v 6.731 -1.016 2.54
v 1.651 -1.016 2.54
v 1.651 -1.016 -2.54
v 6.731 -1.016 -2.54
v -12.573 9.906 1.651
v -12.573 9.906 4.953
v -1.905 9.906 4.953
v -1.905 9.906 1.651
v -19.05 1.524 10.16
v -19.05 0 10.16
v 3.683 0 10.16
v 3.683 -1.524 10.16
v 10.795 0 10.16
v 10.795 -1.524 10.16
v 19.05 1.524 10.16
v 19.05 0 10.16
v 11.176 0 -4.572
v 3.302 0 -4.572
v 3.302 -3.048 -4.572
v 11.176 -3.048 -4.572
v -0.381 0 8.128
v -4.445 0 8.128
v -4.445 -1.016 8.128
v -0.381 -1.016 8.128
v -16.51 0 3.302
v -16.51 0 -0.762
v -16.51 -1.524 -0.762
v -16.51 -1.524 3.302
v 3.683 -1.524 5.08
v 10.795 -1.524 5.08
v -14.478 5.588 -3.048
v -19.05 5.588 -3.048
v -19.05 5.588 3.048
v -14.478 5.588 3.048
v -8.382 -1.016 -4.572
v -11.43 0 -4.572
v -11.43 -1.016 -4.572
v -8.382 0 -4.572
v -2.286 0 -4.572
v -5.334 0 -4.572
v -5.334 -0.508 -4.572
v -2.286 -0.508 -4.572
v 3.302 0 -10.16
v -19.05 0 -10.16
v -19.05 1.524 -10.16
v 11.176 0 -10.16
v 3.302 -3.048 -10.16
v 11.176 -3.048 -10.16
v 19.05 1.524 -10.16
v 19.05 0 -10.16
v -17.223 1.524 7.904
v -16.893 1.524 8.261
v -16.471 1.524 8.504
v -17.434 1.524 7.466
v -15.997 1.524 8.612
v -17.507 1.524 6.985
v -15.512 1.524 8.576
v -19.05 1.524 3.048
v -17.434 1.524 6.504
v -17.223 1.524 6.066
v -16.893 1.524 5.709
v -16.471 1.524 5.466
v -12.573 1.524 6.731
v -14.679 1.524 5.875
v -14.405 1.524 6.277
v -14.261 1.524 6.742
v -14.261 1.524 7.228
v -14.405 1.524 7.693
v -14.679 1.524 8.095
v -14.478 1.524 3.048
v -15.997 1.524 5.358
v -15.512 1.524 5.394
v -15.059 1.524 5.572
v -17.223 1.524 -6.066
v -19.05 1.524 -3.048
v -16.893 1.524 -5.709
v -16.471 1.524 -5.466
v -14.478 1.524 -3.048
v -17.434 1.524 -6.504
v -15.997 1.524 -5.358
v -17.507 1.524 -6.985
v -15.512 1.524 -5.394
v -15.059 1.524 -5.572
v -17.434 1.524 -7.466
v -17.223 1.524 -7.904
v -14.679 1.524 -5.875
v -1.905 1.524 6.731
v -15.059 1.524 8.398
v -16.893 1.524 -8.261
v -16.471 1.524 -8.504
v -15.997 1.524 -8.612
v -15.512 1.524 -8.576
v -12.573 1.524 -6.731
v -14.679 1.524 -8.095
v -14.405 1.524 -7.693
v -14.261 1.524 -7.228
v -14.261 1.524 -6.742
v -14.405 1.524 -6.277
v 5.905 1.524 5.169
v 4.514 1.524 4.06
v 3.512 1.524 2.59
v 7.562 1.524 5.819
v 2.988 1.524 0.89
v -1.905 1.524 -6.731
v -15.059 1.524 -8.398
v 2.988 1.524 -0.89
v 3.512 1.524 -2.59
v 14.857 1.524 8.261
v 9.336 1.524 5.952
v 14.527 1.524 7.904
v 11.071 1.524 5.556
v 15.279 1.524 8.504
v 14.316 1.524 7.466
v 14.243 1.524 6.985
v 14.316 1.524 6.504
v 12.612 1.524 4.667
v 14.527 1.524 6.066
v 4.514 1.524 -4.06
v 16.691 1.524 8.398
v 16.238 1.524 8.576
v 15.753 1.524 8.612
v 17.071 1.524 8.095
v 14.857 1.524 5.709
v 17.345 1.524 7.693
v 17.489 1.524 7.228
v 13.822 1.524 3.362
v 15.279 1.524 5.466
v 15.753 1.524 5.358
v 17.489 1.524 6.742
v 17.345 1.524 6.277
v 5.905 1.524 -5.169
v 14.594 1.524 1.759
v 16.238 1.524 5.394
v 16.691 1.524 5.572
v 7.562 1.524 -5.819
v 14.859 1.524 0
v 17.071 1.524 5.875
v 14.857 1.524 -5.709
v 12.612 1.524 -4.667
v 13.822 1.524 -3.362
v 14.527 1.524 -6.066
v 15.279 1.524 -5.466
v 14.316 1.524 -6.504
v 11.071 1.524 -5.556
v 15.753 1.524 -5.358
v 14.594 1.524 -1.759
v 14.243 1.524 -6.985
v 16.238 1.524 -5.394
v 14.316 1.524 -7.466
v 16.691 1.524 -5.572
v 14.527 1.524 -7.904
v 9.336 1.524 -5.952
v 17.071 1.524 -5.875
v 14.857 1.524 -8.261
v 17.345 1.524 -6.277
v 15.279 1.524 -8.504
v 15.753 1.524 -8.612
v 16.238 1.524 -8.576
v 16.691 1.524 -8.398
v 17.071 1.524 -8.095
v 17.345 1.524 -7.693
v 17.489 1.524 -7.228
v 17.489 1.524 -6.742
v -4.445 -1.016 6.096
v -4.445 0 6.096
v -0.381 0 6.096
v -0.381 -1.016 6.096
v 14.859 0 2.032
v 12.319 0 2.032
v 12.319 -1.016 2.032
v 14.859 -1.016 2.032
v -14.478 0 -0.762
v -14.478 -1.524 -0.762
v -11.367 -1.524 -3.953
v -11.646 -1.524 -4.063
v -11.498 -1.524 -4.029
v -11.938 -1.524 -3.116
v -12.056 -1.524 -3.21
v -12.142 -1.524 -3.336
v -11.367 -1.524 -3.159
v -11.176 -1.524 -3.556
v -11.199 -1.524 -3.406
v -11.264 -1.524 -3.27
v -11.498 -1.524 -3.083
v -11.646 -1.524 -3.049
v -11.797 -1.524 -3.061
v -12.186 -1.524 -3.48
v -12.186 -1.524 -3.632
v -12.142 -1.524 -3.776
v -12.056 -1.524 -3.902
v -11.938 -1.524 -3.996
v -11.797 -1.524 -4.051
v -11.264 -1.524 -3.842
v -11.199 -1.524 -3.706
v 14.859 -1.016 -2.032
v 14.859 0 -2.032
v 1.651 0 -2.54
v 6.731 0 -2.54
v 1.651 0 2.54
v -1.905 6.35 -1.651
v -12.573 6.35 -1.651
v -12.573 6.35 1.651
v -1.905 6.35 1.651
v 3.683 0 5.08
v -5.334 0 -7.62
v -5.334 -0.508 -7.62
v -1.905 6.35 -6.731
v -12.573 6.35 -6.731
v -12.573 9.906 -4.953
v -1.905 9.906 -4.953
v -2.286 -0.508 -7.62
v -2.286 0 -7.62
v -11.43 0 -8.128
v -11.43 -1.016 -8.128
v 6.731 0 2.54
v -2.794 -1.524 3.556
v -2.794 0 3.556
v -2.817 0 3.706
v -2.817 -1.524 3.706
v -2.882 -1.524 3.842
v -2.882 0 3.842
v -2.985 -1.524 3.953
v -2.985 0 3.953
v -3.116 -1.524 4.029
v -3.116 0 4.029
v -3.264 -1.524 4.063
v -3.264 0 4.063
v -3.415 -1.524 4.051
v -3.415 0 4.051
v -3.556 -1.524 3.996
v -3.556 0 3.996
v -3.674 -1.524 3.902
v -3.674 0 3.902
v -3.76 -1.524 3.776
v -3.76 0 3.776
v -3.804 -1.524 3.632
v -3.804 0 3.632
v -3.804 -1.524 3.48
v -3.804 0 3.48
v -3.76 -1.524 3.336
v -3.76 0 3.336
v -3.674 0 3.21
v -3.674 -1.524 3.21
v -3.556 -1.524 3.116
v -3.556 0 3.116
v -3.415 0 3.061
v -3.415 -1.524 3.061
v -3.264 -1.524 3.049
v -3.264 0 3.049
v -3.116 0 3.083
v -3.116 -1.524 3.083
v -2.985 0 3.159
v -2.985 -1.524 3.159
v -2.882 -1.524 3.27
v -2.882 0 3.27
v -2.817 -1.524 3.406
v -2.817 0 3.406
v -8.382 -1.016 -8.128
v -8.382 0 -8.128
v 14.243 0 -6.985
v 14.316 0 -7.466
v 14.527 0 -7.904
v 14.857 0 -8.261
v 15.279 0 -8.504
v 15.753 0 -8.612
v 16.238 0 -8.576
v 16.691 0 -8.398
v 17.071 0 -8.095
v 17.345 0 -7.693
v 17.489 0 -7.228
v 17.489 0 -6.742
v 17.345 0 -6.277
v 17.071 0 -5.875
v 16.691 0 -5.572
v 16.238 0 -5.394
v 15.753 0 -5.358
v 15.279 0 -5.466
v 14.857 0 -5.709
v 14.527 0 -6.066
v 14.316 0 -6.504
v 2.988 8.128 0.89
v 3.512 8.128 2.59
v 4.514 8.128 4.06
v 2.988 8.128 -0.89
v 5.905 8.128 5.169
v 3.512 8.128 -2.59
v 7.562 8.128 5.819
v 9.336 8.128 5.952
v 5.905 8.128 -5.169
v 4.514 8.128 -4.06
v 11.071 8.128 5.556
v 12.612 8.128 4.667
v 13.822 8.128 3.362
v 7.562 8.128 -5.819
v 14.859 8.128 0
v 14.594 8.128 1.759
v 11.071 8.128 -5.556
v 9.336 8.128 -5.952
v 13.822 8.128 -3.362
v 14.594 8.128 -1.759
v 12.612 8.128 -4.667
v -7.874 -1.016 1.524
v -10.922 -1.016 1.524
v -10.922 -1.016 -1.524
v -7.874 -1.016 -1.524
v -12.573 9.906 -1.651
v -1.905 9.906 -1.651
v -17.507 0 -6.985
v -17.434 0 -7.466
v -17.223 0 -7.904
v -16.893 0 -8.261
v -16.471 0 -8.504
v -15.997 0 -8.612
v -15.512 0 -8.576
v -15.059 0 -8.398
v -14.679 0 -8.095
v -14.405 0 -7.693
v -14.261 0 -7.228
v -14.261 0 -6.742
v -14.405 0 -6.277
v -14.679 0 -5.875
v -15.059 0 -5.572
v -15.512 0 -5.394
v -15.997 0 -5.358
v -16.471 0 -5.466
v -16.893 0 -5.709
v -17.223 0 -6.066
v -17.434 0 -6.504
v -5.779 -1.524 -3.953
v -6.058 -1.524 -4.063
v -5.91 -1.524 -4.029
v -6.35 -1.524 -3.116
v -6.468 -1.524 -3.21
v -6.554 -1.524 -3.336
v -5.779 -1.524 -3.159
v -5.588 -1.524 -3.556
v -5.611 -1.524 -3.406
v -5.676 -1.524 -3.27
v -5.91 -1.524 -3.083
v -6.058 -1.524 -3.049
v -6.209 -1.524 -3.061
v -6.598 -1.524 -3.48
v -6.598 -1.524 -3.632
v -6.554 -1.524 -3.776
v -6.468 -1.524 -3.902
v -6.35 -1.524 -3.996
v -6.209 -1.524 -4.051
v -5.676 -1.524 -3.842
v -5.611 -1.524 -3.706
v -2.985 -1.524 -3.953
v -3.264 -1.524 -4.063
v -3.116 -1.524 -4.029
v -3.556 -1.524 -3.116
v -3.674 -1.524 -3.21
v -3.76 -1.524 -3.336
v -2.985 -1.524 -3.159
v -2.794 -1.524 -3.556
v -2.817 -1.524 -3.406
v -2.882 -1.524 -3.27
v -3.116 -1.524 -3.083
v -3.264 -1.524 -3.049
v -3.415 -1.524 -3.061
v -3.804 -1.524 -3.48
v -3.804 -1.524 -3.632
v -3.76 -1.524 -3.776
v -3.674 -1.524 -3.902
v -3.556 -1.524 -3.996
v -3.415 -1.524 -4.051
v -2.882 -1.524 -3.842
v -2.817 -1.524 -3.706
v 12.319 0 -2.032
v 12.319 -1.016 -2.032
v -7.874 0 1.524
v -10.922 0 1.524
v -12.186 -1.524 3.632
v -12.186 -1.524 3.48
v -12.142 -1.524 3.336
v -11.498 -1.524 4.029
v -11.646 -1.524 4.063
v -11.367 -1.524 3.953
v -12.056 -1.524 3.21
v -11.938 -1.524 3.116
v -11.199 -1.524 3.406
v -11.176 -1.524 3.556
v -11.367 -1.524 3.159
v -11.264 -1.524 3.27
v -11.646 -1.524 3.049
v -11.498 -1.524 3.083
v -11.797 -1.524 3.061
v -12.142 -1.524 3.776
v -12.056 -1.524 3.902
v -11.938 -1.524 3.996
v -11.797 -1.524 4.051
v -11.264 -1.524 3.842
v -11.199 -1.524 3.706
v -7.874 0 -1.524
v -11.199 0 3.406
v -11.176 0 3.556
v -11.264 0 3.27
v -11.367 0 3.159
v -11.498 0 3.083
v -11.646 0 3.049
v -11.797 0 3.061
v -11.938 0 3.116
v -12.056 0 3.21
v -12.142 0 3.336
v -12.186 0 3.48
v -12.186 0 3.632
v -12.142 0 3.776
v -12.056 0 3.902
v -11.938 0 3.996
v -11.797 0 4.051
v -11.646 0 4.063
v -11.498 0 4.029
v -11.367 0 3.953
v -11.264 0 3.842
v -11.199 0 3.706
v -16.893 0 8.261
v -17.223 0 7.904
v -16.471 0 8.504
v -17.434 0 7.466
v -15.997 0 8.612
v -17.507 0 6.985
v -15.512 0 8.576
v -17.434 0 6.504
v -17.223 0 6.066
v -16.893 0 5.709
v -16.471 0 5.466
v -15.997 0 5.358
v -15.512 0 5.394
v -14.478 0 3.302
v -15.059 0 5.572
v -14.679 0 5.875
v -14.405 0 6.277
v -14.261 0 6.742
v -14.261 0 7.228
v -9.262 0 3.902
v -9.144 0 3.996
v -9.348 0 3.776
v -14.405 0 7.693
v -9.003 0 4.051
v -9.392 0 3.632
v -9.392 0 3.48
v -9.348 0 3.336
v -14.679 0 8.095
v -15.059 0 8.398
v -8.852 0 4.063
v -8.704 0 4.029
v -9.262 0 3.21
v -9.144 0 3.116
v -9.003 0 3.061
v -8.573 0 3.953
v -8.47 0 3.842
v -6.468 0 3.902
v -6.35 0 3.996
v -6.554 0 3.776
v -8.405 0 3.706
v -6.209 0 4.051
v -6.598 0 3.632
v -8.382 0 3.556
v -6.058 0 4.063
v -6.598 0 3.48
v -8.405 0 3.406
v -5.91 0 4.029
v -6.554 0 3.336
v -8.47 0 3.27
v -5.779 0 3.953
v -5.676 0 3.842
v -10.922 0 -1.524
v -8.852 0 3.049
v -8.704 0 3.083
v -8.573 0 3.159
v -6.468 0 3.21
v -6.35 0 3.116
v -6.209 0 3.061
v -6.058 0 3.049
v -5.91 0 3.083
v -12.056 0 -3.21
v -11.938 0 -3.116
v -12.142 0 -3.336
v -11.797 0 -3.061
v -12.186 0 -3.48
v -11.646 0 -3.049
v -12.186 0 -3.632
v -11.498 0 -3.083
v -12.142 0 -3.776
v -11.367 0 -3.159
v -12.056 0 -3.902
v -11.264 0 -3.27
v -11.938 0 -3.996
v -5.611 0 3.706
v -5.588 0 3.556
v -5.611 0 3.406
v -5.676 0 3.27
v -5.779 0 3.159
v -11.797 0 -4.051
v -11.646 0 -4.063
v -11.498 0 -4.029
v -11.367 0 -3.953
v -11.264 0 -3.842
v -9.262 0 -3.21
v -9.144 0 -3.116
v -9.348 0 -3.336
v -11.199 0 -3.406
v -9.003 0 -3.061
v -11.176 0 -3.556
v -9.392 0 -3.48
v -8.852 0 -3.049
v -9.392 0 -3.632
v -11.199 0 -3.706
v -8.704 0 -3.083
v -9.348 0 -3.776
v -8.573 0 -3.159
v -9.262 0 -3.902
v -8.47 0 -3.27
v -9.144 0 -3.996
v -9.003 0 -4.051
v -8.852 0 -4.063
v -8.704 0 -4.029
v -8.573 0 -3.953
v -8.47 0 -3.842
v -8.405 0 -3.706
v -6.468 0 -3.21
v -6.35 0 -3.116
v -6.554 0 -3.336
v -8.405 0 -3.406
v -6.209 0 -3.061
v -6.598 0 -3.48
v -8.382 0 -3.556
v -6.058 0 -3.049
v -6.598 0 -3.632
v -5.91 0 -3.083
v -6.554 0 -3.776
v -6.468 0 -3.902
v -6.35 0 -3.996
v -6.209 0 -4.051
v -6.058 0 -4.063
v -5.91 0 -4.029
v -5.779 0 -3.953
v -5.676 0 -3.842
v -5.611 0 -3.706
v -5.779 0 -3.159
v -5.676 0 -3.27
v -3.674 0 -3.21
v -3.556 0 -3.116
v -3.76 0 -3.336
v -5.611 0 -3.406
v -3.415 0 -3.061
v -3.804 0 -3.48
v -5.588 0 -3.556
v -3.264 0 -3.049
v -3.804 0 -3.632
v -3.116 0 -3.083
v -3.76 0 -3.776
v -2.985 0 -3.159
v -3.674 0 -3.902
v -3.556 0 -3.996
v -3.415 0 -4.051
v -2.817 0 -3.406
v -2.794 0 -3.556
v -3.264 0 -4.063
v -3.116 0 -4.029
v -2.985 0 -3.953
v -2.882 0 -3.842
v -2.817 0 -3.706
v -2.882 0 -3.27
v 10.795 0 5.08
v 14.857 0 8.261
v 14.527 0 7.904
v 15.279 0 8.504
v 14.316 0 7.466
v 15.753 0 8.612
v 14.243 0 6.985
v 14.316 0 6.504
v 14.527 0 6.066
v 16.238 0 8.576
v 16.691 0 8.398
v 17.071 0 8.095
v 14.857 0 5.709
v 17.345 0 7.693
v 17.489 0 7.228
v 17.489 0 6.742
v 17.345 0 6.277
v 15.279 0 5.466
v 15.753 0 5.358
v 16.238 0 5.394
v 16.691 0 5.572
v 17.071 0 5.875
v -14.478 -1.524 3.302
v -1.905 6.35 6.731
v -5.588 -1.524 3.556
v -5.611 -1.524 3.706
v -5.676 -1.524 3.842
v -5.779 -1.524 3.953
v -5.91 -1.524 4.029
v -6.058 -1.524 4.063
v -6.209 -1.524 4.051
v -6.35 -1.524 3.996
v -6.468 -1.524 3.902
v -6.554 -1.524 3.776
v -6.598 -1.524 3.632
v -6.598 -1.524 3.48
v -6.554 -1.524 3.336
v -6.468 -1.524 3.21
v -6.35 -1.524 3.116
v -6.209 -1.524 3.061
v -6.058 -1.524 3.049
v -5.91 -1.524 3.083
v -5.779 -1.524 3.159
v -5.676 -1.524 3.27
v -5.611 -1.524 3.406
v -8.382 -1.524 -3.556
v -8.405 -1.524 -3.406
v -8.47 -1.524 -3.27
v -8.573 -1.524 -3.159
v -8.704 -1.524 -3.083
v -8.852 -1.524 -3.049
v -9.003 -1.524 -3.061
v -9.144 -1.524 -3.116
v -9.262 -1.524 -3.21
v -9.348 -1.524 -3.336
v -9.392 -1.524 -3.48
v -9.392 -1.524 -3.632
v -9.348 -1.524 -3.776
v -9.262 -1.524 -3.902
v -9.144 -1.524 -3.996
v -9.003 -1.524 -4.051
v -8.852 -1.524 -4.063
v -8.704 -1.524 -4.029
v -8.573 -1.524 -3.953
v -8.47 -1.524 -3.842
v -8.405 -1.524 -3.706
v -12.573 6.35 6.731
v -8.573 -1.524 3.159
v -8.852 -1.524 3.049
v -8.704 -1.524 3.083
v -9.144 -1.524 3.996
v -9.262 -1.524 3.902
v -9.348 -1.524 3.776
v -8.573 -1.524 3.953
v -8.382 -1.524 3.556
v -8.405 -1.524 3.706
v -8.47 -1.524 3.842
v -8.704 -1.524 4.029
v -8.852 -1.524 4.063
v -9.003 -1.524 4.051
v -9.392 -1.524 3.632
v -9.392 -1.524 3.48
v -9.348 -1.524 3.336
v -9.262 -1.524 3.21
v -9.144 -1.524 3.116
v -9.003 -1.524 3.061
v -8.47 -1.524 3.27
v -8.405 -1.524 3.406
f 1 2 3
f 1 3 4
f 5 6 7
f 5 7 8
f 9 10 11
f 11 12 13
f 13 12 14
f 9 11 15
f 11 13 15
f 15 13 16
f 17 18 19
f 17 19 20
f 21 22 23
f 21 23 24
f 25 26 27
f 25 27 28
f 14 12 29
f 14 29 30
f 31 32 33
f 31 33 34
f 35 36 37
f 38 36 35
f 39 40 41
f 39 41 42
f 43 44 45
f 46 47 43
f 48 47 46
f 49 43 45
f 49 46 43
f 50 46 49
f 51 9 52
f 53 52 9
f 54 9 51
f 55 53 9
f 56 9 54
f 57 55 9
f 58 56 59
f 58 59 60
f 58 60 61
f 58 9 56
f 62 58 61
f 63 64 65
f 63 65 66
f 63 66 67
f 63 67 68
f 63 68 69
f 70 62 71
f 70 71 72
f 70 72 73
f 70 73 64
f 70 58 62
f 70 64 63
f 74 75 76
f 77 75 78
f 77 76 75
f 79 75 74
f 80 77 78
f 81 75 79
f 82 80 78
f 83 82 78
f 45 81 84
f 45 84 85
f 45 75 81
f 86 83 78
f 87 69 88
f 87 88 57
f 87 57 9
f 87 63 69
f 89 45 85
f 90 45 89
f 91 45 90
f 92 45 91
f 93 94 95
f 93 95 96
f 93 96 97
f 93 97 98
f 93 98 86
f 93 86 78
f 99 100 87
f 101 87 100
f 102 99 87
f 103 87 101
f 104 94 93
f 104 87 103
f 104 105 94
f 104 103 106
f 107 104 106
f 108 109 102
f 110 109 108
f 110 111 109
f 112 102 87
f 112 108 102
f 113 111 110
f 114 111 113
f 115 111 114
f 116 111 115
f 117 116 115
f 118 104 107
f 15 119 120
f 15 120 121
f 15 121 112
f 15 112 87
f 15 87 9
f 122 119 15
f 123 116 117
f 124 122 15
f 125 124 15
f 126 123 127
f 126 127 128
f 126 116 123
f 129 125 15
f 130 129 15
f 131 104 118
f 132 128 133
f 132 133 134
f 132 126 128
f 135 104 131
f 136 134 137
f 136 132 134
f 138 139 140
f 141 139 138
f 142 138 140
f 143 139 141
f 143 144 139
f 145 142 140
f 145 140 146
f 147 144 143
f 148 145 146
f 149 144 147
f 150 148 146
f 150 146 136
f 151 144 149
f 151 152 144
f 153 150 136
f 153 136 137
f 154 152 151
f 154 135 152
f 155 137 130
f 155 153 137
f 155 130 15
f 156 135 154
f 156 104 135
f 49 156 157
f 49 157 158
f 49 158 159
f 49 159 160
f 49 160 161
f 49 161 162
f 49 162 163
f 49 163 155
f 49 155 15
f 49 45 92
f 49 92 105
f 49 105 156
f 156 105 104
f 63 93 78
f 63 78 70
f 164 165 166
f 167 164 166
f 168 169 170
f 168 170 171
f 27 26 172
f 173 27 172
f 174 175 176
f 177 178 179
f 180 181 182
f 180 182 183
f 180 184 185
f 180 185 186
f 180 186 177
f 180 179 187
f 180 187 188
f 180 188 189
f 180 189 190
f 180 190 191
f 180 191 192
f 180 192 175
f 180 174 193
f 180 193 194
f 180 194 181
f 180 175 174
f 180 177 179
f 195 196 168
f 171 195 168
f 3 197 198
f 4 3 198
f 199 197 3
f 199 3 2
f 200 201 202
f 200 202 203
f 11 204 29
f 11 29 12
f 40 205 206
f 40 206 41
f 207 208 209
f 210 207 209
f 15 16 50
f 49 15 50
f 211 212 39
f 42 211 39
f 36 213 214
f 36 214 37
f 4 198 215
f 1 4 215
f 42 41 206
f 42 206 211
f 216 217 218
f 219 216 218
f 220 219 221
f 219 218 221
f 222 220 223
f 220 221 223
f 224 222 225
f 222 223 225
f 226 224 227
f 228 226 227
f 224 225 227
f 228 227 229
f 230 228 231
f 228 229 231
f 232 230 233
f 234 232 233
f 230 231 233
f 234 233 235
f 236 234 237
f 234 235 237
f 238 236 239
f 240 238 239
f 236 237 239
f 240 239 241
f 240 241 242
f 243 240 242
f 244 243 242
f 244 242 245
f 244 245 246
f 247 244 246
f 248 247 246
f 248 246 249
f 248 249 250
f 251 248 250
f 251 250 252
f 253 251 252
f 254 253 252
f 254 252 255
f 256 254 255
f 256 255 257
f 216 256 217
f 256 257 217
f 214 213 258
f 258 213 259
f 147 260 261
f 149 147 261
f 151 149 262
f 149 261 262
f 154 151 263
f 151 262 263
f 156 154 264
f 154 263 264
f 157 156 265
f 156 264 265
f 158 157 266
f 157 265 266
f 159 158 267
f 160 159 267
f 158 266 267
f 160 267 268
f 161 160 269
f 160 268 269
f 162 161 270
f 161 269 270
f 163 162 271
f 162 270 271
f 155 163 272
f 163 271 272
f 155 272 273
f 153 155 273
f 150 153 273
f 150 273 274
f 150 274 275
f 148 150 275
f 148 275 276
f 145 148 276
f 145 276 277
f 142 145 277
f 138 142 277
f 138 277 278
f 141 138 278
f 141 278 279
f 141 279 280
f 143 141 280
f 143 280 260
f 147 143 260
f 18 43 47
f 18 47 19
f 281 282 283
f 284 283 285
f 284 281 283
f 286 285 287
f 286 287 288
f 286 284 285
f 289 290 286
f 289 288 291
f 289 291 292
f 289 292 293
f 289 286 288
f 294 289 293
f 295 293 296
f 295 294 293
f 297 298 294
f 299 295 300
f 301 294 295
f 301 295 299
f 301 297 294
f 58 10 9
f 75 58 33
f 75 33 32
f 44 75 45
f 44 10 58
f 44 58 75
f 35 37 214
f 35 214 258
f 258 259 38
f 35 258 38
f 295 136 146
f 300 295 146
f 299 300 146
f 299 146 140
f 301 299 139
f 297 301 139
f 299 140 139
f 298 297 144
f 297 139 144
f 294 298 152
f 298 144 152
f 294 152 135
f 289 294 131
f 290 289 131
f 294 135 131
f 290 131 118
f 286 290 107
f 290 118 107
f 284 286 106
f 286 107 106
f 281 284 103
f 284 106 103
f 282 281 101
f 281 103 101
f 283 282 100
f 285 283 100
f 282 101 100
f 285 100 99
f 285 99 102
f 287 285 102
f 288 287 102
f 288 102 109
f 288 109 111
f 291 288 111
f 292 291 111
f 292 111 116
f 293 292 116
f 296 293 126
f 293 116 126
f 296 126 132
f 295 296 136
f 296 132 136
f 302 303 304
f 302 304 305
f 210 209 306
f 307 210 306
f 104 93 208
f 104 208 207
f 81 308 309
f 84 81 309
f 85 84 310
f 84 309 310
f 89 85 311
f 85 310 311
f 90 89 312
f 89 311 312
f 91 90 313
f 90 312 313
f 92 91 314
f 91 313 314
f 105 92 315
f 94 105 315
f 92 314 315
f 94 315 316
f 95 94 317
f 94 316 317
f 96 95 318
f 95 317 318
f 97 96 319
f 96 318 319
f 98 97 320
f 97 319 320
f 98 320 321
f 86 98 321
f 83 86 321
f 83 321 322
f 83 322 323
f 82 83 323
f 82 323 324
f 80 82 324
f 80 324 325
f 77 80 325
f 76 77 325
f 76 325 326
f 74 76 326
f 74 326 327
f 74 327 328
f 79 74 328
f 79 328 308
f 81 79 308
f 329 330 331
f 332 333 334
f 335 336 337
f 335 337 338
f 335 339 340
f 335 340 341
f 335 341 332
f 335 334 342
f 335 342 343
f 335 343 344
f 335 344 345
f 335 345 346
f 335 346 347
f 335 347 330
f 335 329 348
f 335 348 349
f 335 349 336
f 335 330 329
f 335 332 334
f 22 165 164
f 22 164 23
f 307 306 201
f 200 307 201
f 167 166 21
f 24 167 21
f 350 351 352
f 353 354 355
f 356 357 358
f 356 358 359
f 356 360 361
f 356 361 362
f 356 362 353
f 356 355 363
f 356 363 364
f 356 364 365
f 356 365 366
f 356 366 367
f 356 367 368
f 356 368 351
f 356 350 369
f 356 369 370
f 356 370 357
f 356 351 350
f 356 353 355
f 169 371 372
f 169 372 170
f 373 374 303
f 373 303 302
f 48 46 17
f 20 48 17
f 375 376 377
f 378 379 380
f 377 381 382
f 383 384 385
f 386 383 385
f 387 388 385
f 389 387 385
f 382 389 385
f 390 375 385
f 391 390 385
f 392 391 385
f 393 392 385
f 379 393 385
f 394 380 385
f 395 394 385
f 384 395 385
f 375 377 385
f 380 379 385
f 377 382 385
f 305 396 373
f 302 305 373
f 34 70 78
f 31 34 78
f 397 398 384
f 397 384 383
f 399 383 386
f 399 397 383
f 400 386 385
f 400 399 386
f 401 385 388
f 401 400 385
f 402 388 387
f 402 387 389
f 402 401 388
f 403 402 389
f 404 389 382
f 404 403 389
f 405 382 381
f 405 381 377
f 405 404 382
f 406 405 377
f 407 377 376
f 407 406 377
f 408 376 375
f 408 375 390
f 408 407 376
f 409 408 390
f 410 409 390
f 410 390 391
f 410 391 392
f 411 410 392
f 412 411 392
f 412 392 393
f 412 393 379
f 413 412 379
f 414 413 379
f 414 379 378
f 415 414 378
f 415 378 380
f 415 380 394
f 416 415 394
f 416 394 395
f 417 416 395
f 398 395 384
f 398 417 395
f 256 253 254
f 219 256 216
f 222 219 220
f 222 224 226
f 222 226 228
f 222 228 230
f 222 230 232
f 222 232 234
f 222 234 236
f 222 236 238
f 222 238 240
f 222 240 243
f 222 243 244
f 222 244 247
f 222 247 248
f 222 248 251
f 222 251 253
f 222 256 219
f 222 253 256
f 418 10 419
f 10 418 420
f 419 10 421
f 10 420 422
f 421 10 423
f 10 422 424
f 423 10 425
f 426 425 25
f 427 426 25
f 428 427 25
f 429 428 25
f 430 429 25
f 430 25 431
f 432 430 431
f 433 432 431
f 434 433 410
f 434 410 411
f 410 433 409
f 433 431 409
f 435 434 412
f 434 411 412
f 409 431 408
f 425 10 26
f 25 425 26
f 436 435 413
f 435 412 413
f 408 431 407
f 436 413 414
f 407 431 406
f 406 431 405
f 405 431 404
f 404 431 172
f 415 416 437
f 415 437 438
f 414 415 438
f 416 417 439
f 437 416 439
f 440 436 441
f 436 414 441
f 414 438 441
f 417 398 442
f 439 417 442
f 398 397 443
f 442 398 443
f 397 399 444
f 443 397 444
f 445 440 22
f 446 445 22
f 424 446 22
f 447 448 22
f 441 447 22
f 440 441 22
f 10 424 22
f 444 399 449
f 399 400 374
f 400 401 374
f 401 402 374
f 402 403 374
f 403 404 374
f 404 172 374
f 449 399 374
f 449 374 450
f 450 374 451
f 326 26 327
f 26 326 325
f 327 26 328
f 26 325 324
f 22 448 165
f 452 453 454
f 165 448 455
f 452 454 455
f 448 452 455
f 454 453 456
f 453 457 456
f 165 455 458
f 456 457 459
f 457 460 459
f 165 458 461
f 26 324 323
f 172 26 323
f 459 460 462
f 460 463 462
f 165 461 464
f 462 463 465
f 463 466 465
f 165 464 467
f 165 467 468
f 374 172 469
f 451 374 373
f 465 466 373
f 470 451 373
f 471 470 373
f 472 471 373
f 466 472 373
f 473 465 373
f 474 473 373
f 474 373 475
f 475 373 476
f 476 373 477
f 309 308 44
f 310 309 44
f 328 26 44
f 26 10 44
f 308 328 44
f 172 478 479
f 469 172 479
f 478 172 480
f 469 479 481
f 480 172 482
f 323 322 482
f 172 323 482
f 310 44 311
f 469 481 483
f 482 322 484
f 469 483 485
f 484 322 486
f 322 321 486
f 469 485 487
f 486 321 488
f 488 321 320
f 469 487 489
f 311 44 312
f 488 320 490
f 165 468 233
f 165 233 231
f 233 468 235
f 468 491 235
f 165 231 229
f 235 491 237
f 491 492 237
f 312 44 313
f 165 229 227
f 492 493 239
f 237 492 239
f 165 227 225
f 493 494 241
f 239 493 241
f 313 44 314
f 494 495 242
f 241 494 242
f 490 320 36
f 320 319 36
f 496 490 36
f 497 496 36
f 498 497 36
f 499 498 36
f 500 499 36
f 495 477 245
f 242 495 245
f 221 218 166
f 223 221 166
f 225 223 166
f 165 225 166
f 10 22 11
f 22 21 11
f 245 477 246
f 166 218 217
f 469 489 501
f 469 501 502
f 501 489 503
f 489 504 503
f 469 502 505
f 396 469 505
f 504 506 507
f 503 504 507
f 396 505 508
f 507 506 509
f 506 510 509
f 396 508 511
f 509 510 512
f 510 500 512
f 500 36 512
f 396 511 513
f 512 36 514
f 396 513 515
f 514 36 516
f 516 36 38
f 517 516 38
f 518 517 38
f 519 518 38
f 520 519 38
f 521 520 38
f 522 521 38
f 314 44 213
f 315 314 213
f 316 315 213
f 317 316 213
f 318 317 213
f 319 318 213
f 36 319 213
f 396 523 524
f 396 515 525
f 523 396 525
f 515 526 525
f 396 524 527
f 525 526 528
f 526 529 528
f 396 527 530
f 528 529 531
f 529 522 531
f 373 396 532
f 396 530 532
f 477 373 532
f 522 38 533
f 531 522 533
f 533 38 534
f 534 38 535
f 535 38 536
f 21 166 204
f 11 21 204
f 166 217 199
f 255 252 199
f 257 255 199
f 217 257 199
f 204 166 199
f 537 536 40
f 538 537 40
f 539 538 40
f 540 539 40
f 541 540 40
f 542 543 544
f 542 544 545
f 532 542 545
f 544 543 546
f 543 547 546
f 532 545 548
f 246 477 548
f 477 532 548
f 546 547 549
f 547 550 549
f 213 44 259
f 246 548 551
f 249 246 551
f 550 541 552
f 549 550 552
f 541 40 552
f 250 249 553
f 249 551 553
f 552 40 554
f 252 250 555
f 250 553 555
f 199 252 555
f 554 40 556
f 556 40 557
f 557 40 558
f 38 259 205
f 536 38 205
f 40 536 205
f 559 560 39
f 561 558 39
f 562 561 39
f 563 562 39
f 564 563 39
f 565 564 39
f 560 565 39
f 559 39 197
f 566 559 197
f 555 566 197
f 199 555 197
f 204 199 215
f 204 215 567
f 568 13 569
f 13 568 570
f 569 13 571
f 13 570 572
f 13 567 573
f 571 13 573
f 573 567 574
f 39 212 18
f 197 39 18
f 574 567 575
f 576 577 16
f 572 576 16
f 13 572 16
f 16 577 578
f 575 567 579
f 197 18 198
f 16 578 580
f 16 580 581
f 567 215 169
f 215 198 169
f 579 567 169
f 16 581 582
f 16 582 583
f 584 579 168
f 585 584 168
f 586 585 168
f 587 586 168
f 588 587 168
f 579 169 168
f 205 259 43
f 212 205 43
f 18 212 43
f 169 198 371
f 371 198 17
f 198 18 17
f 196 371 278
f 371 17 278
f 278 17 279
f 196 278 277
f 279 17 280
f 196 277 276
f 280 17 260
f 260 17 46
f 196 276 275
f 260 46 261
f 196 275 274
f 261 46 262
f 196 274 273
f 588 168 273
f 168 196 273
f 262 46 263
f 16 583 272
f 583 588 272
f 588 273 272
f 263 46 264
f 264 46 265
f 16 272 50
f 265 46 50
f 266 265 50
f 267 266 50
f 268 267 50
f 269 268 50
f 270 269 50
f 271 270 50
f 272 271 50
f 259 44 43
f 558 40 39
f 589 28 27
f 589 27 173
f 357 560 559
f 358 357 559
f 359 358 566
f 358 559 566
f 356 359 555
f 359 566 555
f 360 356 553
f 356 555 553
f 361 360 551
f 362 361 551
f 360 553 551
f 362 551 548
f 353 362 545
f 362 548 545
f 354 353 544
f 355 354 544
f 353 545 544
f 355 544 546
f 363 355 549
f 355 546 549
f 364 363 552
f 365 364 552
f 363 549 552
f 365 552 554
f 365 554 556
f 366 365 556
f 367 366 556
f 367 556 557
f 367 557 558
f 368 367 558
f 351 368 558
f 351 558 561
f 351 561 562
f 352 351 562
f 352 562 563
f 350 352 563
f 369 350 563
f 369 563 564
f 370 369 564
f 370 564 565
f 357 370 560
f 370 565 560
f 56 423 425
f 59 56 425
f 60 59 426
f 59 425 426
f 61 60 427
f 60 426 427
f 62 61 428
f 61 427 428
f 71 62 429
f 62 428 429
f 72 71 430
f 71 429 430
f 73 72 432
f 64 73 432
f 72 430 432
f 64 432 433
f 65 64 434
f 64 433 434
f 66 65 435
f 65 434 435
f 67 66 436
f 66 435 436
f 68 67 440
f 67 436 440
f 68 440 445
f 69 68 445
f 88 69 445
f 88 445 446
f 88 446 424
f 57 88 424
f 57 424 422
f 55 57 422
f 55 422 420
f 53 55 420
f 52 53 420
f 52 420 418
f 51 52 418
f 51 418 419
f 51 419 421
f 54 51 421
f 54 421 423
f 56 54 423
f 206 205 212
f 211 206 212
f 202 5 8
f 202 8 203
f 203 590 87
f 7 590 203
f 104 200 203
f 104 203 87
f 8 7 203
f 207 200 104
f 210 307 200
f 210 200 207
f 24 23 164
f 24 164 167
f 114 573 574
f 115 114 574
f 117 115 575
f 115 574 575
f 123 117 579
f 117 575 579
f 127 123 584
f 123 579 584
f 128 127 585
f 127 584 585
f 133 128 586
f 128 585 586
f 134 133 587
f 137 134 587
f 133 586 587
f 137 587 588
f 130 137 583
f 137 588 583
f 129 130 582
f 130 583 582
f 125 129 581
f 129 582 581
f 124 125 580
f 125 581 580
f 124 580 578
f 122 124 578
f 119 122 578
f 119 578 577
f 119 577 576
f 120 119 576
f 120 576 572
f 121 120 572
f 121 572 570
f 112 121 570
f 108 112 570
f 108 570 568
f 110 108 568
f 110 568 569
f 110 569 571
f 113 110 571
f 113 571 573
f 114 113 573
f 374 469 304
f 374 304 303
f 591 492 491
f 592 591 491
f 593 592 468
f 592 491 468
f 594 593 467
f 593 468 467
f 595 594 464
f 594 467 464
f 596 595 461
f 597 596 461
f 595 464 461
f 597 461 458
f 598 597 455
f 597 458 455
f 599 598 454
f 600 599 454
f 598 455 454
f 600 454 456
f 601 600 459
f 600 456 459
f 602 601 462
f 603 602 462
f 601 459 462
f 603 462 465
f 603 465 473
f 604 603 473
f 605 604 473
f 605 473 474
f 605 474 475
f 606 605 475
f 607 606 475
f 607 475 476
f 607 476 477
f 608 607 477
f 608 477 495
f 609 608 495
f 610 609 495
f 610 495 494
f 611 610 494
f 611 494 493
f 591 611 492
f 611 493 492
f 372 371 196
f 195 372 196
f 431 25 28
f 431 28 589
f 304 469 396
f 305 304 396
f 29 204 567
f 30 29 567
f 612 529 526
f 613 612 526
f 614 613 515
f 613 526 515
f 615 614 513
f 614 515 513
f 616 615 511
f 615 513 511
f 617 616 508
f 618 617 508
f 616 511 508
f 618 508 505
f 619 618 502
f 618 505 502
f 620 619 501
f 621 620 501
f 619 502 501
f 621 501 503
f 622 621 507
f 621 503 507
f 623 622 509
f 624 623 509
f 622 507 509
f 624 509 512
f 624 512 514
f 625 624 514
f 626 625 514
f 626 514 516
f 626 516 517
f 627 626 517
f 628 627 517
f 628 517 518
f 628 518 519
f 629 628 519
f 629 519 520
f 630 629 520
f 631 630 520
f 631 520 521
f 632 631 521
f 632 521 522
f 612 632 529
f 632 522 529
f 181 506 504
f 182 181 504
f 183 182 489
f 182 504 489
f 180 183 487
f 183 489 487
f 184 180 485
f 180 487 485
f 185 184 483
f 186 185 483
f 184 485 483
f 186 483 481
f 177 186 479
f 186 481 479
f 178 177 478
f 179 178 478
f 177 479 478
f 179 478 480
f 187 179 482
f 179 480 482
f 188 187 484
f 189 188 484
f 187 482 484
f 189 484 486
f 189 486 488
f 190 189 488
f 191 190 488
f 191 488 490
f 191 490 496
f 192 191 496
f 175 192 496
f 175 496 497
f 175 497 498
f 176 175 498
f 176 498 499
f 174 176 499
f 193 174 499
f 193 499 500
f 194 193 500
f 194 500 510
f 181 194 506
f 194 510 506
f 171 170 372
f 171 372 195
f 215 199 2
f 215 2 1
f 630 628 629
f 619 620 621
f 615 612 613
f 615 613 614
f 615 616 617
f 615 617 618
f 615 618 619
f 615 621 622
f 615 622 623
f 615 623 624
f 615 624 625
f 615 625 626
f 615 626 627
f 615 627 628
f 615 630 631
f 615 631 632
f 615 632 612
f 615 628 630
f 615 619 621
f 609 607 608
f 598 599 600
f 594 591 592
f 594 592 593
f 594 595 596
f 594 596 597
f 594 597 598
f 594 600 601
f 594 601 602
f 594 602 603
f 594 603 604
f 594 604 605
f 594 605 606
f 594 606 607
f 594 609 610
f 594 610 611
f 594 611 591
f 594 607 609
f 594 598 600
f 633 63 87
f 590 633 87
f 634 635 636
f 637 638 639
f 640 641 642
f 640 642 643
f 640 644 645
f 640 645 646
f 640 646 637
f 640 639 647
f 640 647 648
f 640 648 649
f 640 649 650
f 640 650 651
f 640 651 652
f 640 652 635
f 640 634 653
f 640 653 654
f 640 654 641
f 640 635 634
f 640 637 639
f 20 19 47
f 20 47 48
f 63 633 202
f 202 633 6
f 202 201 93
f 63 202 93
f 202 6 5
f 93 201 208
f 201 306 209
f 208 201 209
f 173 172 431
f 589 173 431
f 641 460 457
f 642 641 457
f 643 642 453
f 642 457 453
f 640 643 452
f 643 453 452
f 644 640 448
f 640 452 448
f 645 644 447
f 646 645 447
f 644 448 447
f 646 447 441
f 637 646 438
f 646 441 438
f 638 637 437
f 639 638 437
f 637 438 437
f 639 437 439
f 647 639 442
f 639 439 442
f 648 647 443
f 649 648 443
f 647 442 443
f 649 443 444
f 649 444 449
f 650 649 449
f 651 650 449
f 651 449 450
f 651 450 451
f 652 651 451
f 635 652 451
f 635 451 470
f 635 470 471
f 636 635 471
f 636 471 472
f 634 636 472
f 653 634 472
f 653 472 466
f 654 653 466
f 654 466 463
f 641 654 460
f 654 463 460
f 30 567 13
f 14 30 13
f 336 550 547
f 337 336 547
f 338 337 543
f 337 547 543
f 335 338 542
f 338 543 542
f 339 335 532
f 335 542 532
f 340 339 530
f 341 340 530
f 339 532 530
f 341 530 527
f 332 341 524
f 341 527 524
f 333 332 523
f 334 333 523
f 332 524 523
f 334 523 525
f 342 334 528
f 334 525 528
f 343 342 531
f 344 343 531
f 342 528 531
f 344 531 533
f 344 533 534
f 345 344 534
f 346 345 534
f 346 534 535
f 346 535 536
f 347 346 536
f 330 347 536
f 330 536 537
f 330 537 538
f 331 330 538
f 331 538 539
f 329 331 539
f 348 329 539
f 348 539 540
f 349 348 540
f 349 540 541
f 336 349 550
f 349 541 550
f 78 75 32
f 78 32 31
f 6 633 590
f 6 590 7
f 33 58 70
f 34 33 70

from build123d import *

# Parameters (mm, degrees)
SKETCH1_W               = 38.1
SKETCH1_H               = 20.32
BOSS_EXTRUDE1_DEPTH     = 1.524
F_4_CLEARANCE_HOLE1_D   = 3.2639
SKETCH4_W               = 4.572
SKETCH4_H               = 6.096
BOSS_EXTRUDE2_DEPTH     = 4.064
SKETCH5_R               = 5.969
BOSS_EXTRUDE3_DEPTH     = 6.604
SKETCH6_W               = 10.668
SKETCH6_H               = 13.462
BOSS_EXTRUDE4_DEPTH     = 4.826
BOSS_EXTRUDE5_DEPTH     = 10.668
SKETCH8_W               = 7.874
SKETCH8_H               = 5.588
BOSS_EXTRUDE6_DEPTH     = 3.048
SKETCH9_W               = 7.112
SKETCH9_H               = 5.08
BOSS_EXTRUDE7_DEPTH     = 1.524
SKETCH10_W              = 2.54
SKETCH10_H              = 4.064
BOSS_EXTRUDE8_DEPTH     = 1.016
SKETCH11_W              = 5.08
SKETCH11_H              = 5.08
BOSS_EXTRUDE9_DEPTH     = 1.016
SKETCH12_W              = 4.064
SKETCH12_H              = 2.032
BOSS_EXTRUDE10_DEPTH    = 1.016
SKETCH13_W              = 3.048
SKETCH13_H              = 3.048
BOSS_EXTRUDE11_DEPTH    = 0.508
SKETCH14_W              = 3.048
SKETCH14_H              = 3.556
BOSS_EXTRUDE12_DEPTH    = 1.016
SKETCH15_W              = 2.032
SKETCH15_H              = 4.064
BOSS_EXTRUDE13_DEPTH    = 1.524
SKETCH16_W              = 3.048
SKETCH16_H              = 3.048
BOSS_EXTRUDE14_DEPTH    = 1.016
SKETCH17_R              = 0.508
BOSS_EXTRUDE15_DEPTH    = 1.524
LPATTERN1_COUNT         = 4
LPATTERN1_PITCH         = 2.794
MIRROR1_COPY_1_SKETCH_R = 0.508
MIRROR1_COPY_1_DEPTH    = 1.524
MIRROR1_COPY_2_SKETCH_R = 0.508
MIRROR1_COPY_2_DEPTH    = 1.524
MIRROR1_COPY_3_SKETCH_R = 0.508
MIRROR1_COPY_3_DEPTH    = 1.524


with BuildPart() as part:
    # Sketch1 → Boss-Extrude1 (new body)
    with BuildSketch(Plane(origin=(0, 0, 0), x_dir=(1, 0, 0), z_dir=(0, 1, 0))):
        Rectangle(SKETCH1_W, SKETCH1_H)
    extrude(amount=BOSS_EXTRUDE1_DEPTH)

    # #4 Clearance Hole1 (through all)
    with Locations(Plane(origin=(0, 1.524, 0), x_dir=(1, 0, 0), z_dir=(0, 1, 0))):
        with Locations((-15.875, 6.985), (15.875, -6.985), (-15.875, -6.985), (15.875, 6.985)):
            Hole(F_4_CLEARANCE_HOLE1_D / 2)

    # Sketch4 → Boss-Extrude2 (add)
    with BuildSketch(Plane(origin=(0, 1.524, 0), x_dir=(1, 0, 0), z_dir=(0, 1, 0))):
        with Locations((-16.764, 0)):
            Rectangle(SKETCH4_W, SKETCH4_H)
    extrude(amount=BOSS_EXTRUDE2_DEPTH)

    # Sketch5 → Boss-Extrude3 (add)
    with BuildSketch(Plane(origin=(0, 1.524, 0), x_dir=(1, 0, 0), z_dir=(0, 1, 0))):
        with Locations((8.89, 0)):
            Circle(SKETCH5_R)
    extrude(amount=BOSS_EXTRUDE3_DEPTH)

    # Sketch6 → Boss-Extrude4 (add)
    with BuildSketch(Plane(origin=(0, 1.524, 0), x_dir=(1, 0, 0), z_dir=(0, 1, 0))):
        with Locations((-7.239, 0)):
            Rectangle(SKETCH6_W, SKETCH6_H)
    extrude(amount=BOSS_EXTRUDE4_DEPTH)

    # Sketch7 → Boss-Extrude5 (add)
    with BuildSketch(Plane.ZY.offset(12.573)):
        Polygon((-6.731, 6.35), (-4.953, 9.906), (-1.651, 9.906), (-1.651, 6.35), align=None)
        Polygon((6.731, 6.35), (4.953, 9.906), (1.651, 9.906), (1.651, 6.35), align=None)
    extrude(amount=-BOSS_EXTRUDE5_DEPTH)

    # Sketch8 → Boss-Extrude6 (add)
    with BuildSketch(Plane.XZ):
        with Locations((7.239, -7.366)):
            Rectangle(SKETCH8_W, SKETCH8_H)
    extrude(amount=BOSS_EXTRUDE6_DEPTH)

    # Sketch9 → Boss-Extrude7 (add)
    with BuildSketch(Plane.XZ):
        with Locations((7.239, 7.62)):
            Rectangle(SKETCH9_W, SKETCH9_H)
    extrude(amount=BOSS_EXTRUDE7_DEPTH)

    # Sketch10 → Boss-Extrude8 (add)
    with BuildSketch(Plane.XZ):
        with Locations((13.589, 0)):
            Rectangle(SKETCH10_W, SKETCH10_H)
    extrude(amount=BOSS_EXTRUDE8_DEPTH)

    # Sketch11 → Boss-Extrude9 (add)
    with BuildSketch(Plane.XZ):
        with Locations((4.191, 0)):
            Rectangle(SKETCH11_W, SKETCH11_H)
    extrude(amount=BOSS_EXTRUDE9_DEPTH)

    # Sketch12 → Boss-Extrude10 (add)
    with BuildSketch(Plane.XZ):
        with Locations((-2.413, 7.112)):
            Rectangle(SKETCH12_W, SKETCH12_H)
    extrude(amount=BOSS_EXTRUDE10_DEPTH)

    # Sketch13 → Boss-Extrude11 (add)
    with BuildSketch(Plane.XZ):
        with Locations((-3.81, -6.096)):
            Rectangle(SKETCH13_W, SKETCH13_H)
    extrude(amount=BOSS_EXTRUDE11_DEPTH)

    # Sketch14 → Boss-Extrude12 (add)
    with BuildSketch(Plane.XZ):
        with Locations((-9.906, -6.35)):
            Rectangle(SKETCH14_W, SKETCH14_H)
    extrude(amount=BOSS_EXTRUDE12_DEPTH)

    # Sketch15 → Boss-Extrude13 (add)
    with BuildSketch(Plane.XZ):
        with Locations((-15.494, 1.27)):
            Rectangle(SKETCH15_W, SKETCH15_H)
    extrude(amount=BOSS_EXTRUDE13_DEPTH)

    # Sketch16 → Boss-Extrude14 (add)
    with BuildSketch(Plane.XZ):
        with Locations((-9.398, 0)):
            Rectangle(SKETCH16_W, SKETCH16_H)
    extrude(amount=BOSS_EXTRUDE14_DEPTH)

    # Sketch17 → Boss-Extrude15 (add)
    with BuildSketch(Plane.XZ):
        with Locations((-11.684, -3.556)):
            Circle(SKETCH17_R)
    boss_extrude15 = extrude(amount=BOSS_EXTRUDE15_DEPTH)

    # LPattern1: Boss-Extrude15 ×4
    with Locations(*[(i * LPATTERN1_PITCH, 0, 0) for i in range(1, LPATTERN1_COUNT)]):
        add(boss_extrude15)

    # Mirror1: Boss-Extrude15 across plane
    add(boss_extrude15.mirror(Plane.XY))

    # Mirror1 copy 1 sketch → Mirror1 copy 1 (add)
    with BuildSketch(Plane(origin=(2.794, 0, 0), x_dir=(1, 0, 0), z_dir=(0, -1, 0))):
        with Locations((-11.684, 3.556)):
            Circle(MIRROR1_COPY_1_SKETCH_R)
    extrude(amount=MIRROR1_COPY_1_DEPTH)

    # Mirror1 copy 2 sketch → Mirror1 copy 2 (add)
    with BuildSketch(Plane(origin=(5.588, 0, 0), x_dir=(1, 0, 0), z_dir=(0, -1, 0))):
        with Locations((-11.684, 3.556)):
            Circle(MIRROR1_COPY_2_SKETCH_R)
    extrude(amount=MIRROR1_COPY_2_DEPTH)

    # Mirror1 copy 3 sketch → Mirror1 copy 3 (add)
    with BuildSketch(Plane(origin=(8.382, 0, 0), x_dir=(1, 0, 0), z_dir=(0, -1, 0))):
        with Locations((-11.684, 3.556)):
            Circle(MIRROR1_COPY_3_SKETCH_R)
    extrude(amount=MIRROR1_COPY_3_DEPTH)


solid = part.part
